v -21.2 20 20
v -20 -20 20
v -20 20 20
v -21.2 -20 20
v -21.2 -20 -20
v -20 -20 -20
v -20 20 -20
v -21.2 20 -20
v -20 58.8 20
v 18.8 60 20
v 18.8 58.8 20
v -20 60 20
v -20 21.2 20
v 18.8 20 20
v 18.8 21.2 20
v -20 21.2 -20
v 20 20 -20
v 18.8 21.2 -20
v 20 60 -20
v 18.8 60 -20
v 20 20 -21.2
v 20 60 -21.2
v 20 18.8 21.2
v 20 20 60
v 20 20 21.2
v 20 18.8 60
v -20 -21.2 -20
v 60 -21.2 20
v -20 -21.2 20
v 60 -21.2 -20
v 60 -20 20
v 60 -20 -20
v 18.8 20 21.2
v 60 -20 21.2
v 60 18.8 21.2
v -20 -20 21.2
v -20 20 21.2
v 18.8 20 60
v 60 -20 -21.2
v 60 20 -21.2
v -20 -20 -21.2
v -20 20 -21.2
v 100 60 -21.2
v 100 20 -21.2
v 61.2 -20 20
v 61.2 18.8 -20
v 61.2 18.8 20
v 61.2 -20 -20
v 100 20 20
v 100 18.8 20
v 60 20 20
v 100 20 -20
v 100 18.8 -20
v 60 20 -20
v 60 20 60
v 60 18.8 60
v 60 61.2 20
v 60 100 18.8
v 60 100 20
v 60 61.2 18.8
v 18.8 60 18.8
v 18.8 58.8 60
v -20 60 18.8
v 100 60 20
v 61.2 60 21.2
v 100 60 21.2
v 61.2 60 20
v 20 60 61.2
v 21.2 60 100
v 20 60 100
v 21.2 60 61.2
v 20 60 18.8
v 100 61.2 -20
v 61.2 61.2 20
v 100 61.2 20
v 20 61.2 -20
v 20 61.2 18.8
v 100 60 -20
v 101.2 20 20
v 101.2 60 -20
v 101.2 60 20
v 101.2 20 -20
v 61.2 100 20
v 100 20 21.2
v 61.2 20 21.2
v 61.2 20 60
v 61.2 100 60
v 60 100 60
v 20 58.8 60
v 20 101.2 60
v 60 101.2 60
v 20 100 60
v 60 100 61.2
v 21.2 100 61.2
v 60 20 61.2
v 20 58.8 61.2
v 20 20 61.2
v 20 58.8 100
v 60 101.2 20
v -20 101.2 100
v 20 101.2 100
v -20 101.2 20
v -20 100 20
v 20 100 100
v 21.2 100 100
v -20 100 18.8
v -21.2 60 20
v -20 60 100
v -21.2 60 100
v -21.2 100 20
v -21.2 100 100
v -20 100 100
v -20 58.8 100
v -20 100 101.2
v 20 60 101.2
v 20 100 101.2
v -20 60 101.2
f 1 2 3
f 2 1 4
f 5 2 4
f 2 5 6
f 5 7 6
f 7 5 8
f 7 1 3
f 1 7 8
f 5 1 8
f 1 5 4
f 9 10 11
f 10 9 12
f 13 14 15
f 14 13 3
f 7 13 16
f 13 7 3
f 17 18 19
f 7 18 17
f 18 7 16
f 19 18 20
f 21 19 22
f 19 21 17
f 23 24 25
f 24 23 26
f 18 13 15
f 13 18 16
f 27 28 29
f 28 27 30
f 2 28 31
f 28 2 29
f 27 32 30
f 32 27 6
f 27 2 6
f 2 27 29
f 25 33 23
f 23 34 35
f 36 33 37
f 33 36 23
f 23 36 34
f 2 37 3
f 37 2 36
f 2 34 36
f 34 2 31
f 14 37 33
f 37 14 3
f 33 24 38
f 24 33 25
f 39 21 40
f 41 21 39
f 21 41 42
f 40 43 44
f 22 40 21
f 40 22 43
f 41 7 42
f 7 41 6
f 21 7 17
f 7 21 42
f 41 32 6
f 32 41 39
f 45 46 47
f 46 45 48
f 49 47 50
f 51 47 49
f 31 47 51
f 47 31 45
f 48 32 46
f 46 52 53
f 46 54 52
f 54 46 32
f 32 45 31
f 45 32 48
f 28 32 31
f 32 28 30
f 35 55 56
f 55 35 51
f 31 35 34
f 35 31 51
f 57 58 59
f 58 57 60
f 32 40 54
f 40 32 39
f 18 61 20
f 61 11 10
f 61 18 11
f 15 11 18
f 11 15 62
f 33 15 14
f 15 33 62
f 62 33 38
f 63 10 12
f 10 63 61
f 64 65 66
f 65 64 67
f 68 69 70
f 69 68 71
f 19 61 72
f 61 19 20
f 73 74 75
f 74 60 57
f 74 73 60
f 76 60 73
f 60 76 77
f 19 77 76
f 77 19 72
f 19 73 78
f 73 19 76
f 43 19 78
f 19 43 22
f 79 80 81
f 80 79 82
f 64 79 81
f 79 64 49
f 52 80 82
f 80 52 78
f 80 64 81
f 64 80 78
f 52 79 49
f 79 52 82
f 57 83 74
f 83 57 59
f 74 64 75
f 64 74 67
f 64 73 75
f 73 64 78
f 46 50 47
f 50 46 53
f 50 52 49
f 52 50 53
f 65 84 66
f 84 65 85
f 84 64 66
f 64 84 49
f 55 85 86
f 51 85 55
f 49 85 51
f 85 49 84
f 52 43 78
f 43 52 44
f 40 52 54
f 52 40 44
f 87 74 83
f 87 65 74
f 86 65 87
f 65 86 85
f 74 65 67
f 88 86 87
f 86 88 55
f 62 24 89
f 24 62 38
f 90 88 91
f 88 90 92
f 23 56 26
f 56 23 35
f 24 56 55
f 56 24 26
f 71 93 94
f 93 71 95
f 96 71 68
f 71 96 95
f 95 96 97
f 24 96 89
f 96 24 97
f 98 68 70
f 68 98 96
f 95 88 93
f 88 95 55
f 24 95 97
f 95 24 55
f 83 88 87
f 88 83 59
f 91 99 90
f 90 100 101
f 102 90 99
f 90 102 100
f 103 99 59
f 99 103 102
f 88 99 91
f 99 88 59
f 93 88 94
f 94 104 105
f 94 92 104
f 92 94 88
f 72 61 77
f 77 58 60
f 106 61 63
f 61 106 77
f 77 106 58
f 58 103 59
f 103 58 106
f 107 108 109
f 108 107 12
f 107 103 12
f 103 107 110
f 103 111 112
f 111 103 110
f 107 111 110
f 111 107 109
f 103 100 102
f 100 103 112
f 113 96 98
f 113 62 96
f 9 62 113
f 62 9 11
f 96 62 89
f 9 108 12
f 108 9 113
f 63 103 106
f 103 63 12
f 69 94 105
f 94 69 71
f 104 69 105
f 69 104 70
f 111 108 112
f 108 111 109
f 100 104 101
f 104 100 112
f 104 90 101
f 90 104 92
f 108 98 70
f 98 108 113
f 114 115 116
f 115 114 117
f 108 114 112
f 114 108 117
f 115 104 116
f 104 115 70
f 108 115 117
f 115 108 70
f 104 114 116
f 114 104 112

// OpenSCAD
// file: ../lib/geometry_utils.scad
// =======================================
// geometry_utils.scad — adjacency + faces
// =======================================

CUBE_FACE_NORMS = [
    [1, 0, 0],
    [-1, 0, 0],
    [0, 1, 0],
    [0, -1, 0],
    [0, 0, 1],
    [0, 0, -1],
];

function has_cube_at(pos, arr) =
    len([for (a = arr) if (a == pos) 1]) > 0;

function exposed_faces(pos, all) =
    [for (n = CUBE_FACE_NORMS) if (!has_cube_at(pos + n, all)) n];

module triangle(p1, p2, p3) {
    polygon(points=[p1, p2, p3]);
}
// file: ../lib/color_utils.scad
// =======================================
// color_utils.scad — palette + color logic
// =======================================

PALETTE_BLOCK = [
    [0.90, 0.10, 0.10],
    [0.10, 0.55, 0.95],
    [0.10, 0.75, 0.35],
    [0.95, 0.70, 0.10],
    [0.60, 0.35, 0.95],
    [0.90, 0.30, 0.55],
    [0.15, 0.80, 0.80],
    [0.65, 0.65, 0.65],
];

PALETTE_PANEL = [
    [0.05, 0.85, 0.25],
    [0.95, 0.50, 0.15],
    [0.20, 0.70, 0.95],
    [0.95, 0.85, 0.20],
    [0.65, 0.40, 0.90],
    [0.90, 0.25, 0.70],
    [0.30, 0.90, 0.90],
    [0.45, 0.45, 0.45],
];

function hash3i(p) = p.x * 73856093 + p.y * 19349663 + p.z * 83492791;

function palette_pick(palette, key) =
    let (i = abs(hash3i(key)) % len(palette)) palette[i];

function rgba_from_rgb_alpha(rgb, a) = [rgb[0], rgb[1], rgb[2], a];

function select_rgba(use_palette, palette, fallback_rgb, key, alpha) =
    use_palette ? rgba_from_rgb_alpha(palette_pick(palette, key), alpha)
    : rgba_from_rgb_alpha(fallback_rgb, alpha);
// file: ../lib/math_utils.scad
// =======================================
// math_utils.scad — vector math utilities
// =======================================

EPS = 1e-9;

function dot(a, b) = a.x * b.x + a.y * b.y + a.z * b.z;
function cross(a, b) = [a.y * b.z - a.z * b.y, a.z * b.x - a.x * b.z, a.x * b.y - a.y * b.x];
function normv(v) = max(EPS, norm(v));
function clamp(x, a, b) = min(b, max(a, x));

function rot_angle_from_x(n) = acos(clamp(dot([1, 0, 0], n) / normv(n), -1, 1));

function rot_axis_from_x(n) =
    let (c = cross([1, 0, 0], n)) (norm(c) < EPS && dot([1, 0, 0], n) < 0) ? [0, 0, 1] : c;
// file: ../cube_cluster.scad
// ==================================================
// cube_cluster.scad — multi-cube assembly system
// ==================================================

include <lib/math_utils.scad>
include <lib/color_utils.scad>
include <lib/geometry_utils.scad>

module unit_cube(dim, col) color(col) cube([dim, dim, dim], center=true);

module panelled_cube(
    dim,
    th,
    faces,
    pos,
    use_palette = true,
    rgb_fallback = [0, 1, 0],
    alpha = 1.0
) {
    for (n = faces) {
        col = select_rgba(use_palette, PALETTE_PANEL, rgb_fallback, pos + n, alpha);
        color(col)
            rotate(a=rot_angle_from_x(n), v=rot_axis_from_x(n))
                translate([dim / 2 + th / 2, 0, 0])
                    cube([th, dim, dim], center=true);
    }
}

module cube_cluster(
    dim,
    th,
    cubes,
    show_panels = true,
    use_block_palette = true,
    use_panel_palette = true,
    block_rgb = [0.10, 0.60, 1.00],
    panel_rgb = [0.10, 1.00, 0.10],
    block_alpha = 0.35,
    panel_alpha = 0.9
) {
    for (p = cubes) {
        block_col = select_rgba(use_block_palette, PALETTE_BLOCK, block_rgb, p, block_alpha);
        translate(p * dim) {
            unit_cube(dim, block_col);
            if (show_panels)
                panelled_cube(
                    dim, th, exposed_faces(p, cubes), p,
                    use_panel_palette, panel_rgb, panel_alpha
                );
        }
    }
}
// main file
// Planning a box from cubes
// A cluster of 40 mm cubes with a panel on every exposed face, and no connectors.

include <../cube_cluster.scad>

dim = 40;
th = 1.2;

cubes = [
    [0, 0, 0],
    [1, 0, 0],
    [1, 1, 0],
    [2, 1, 0],
    [1, 1, 1],
    [1, 2, 1],
    [0, 2, 1],
    [0, 2, 2],
];

cube_cluster(dim, th, cubes);
